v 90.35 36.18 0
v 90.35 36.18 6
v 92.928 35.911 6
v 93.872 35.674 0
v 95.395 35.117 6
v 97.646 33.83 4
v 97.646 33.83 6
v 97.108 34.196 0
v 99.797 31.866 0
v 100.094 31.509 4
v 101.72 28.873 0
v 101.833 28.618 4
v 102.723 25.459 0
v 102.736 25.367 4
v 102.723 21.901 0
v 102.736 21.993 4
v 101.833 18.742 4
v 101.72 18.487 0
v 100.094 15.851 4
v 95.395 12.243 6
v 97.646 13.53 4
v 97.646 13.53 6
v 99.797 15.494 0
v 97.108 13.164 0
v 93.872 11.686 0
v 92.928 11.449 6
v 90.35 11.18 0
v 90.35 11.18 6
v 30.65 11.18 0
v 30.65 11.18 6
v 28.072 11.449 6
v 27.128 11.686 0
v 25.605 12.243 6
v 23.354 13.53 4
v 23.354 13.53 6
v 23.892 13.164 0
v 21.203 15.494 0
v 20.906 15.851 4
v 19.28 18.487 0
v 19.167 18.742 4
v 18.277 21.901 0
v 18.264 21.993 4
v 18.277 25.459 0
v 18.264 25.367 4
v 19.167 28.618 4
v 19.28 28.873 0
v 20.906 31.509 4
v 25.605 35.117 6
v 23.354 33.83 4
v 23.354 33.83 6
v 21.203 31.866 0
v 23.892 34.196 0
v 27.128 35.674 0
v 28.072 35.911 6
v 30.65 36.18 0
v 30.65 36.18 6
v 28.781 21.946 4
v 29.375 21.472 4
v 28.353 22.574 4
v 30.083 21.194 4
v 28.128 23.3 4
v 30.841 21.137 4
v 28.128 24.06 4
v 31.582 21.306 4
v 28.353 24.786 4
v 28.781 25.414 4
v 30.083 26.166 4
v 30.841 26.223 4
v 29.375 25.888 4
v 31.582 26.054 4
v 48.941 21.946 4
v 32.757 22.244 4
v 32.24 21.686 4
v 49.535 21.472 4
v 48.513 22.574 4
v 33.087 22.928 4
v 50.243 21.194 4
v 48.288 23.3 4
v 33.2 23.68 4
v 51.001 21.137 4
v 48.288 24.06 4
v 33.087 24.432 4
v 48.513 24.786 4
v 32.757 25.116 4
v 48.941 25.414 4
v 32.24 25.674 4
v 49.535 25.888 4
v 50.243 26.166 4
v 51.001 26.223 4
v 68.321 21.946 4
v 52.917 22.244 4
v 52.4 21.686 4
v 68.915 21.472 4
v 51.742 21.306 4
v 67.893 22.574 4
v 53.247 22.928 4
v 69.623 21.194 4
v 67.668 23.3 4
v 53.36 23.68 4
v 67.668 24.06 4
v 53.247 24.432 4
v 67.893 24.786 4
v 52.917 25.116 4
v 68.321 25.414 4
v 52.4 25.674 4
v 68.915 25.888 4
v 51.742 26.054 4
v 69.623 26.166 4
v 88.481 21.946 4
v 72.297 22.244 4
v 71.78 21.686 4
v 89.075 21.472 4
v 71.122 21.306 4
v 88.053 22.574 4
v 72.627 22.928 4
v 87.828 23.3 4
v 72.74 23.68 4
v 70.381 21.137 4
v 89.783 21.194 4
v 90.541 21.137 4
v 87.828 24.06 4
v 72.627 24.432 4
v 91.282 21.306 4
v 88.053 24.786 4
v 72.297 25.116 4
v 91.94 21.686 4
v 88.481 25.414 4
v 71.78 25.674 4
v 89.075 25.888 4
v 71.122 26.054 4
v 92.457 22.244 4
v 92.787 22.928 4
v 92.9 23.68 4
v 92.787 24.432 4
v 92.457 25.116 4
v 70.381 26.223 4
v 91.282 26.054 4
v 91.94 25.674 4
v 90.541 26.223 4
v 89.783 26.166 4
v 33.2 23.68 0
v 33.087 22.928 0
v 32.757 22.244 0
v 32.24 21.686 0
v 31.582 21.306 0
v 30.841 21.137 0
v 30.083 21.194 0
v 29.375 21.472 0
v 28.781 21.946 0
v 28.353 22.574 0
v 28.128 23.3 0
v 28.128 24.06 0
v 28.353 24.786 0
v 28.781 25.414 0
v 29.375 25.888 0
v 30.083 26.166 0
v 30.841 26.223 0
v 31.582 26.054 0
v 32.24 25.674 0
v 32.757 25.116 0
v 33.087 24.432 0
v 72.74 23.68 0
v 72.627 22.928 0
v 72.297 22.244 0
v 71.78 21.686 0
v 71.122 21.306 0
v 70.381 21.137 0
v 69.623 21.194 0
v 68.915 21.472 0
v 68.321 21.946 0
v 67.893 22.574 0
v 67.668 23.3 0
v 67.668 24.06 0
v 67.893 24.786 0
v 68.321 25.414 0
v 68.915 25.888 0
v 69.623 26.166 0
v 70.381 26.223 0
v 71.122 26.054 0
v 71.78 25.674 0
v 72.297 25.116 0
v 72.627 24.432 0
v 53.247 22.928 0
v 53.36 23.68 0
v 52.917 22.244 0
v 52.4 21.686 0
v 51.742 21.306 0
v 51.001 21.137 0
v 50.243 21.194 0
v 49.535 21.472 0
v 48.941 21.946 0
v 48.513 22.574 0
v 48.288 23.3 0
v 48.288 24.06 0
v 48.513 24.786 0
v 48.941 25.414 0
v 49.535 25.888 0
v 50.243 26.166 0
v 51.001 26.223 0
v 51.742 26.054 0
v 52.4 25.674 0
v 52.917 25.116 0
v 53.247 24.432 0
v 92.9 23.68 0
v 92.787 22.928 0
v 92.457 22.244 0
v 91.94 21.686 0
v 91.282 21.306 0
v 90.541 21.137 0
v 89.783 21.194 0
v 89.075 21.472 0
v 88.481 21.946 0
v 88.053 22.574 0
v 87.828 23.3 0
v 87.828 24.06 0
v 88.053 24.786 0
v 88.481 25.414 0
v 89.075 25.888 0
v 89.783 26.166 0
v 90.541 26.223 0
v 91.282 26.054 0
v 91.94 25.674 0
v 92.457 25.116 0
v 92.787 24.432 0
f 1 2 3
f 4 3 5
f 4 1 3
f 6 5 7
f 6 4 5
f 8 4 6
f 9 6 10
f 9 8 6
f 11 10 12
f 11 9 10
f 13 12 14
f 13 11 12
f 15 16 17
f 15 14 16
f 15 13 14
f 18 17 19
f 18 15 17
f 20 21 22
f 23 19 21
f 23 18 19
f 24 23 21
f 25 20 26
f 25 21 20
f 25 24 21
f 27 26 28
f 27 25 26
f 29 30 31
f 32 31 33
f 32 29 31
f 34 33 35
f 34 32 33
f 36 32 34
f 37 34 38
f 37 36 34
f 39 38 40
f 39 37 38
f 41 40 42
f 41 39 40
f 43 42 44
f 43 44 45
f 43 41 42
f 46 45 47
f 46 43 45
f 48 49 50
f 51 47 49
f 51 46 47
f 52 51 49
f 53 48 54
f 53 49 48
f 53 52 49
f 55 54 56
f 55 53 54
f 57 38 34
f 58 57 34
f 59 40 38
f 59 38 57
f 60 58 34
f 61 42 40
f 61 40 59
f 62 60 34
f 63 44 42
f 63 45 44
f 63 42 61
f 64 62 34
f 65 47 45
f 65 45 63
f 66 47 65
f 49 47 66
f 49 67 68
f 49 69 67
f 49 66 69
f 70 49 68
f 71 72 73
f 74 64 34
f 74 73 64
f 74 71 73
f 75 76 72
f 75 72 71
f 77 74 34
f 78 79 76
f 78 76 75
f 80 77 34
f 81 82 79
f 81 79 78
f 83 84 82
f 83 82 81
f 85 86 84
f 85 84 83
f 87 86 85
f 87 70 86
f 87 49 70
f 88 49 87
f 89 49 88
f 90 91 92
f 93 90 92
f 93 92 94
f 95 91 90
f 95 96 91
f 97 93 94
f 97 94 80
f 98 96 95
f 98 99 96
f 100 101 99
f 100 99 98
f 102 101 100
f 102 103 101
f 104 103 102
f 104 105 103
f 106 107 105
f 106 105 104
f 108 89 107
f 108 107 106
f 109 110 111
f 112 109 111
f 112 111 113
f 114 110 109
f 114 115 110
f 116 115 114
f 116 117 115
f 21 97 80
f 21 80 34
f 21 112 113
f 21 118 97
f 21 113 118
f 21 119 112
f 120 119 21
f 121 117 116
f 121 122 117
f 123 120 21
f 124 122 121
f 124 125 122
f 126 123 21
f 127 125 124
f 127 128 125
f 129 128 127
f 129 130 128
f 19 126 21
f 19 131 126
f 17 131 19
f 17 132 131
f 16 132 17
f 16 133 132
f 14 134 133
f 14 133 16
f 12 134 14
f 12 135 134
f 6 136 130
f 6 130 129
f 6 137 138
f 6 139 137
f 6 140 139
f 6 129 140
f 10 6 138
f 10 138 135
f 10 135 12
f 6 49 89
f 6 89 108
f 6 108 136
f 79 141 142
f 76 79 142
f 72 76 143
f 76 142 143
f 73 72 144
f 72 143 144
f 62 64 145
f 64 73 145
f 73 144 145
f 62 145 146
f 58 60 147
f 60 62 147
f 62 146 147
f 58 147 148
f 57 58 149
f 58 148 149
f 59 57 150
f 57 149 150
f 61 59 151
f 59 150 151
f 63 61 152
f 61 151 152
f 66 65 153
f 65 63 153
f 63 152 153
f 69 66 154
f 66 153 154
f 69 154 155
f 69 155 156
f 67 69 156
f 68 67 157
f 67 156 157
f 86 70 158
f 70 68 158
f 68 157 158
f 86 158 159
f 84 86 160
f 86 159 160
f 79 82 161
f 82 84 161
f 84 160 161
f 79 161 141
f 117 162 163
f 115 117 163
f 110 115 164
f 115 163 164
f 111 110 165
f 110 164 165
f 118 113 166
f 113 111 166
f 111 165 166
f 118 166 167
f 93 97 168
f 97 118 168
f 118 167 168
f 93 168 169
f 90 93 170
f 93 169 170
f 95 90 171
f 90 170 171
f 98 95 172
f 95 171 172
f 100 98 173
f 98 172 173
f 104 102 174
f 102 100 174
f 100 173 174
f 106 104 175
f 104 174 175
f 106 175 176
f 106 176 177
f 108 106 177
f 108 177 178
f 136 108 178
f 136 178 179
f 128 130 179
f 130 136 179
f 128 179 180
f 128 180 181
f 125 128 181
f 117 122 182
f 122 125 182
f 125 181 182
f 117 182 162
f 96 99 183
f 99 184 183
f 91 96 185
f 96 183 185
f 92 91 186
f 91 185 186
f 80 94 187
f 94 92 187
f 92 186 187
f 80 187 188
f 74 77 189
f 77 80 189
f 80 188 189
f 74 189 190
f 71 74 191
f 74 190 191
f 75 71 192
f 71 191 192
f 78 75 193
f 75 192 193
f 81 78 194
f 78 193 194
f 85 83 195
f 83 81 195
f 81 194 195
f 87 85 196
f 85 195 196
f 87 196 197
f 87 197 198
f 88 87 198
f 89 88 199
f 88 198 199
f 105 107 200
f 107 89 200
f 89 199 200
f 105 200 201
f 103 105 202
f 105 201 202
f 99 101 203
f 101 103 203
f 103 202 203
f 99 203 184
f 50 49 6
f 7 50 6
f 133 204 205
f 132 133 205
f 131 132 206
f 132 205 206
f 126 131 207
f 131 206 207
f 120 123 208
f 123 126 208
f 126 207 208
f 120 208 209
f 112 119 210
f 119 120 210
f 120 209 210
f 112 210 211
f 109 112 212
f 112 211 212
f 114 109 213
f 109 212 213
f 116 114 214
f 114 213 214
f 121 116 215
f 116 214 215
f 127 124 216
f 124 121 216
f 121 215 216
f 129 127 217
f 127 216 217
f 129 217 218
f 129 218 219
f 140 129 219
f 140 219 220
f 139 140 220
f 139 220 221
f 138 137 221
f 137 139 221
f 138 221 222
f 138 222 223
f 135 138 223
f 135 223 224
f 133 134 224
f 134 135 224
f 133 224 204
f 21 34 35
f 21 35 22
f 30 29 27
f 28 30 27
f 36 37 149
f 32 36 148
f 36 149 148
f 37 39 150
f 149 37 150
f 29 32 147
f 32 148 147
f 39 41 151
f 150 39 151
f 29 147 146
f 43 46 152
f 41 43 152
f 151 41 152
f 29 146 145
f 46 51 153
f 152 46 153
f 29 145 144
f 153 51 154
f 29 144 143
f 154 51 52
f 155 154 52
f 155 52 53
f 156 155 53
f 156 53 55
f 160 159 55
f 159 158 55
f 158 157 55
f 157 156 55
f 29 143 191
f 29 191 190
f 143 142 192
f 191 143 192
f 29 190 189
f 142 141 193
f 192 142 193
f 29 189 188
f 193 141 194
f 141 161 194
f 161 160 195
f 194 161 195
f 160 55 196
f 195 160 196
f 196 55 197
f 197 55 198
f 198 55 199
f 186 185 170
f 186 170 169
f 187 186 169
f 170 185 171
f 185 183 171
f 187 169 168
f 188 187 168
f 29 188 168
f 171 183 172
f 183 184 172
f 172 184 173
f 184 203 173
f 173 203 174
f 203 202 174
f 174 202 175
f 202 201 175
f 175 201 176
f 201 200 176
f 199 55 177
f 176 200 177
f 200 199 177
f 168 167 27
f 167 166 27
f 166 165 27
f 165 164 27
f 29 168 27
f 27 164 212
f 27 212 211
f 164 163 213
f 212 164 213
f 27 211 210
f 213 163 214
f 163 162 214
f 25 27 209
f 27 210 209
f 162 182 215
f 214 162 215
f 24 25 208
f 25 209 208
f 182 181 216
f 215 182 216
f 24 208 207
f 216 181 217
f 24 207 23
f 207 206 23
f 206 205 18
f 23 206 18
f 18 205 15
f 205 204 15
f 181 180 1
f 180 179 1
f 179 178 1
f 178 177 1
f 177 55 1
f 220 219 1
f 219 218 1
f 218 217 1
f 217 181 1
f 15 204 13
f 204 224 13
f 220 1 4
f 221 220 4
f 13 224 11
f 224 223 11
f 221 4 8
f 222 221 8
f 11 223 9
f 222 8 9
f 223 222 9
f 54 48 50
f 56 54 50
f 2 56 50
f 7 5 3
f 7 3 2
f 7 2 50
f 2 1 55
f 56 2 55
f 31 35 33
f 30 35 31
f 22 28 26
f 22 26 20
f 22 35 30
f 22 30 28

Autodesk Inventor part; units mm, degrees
ref_plane "YZ Plane" through (0, 0, 0) normal (1, 0, 0) x (0, 1, 0)
ref_plane "XZ Plane" through (0, 0, 0) normal (0, 1, 0) x (-1, 0, 0)
ref_plane "XY Plane" through (0, 0, 0) normal (0, 0, 1) x (1, 0, 0)
sketch "Sketch1" plane through (0, 0, 0) normal (0, 0, 1) x (1, 0, 0)
  arc A0 (-3, 3) -> (0, 0) centre (0, 3) ccw construction
  line L0 (0, 0) -> (121, 0) construction
  arc A1 (121, 0) -> (124, 3) centre (121, 3) ccw construction
  line L1 (124, 3) -> (124, 85) construction
  arc A2 (124, 85) -> (121, 88) centre (121, 85) ccw construction
  line L2 (121, 88) -> (0, 88) construction
  arc A3 (0, 88) -> (-3, 85) centre (0, 85) ccw construction
  line L3 (-3, 85) -> (-3, 3) construction
  arc A4 (63.75, 4.5) -> (63.75, 7.5) centre (63.75, 6) ccw construction
  line L4 (57.25, 4.5) -> (63.75, 4.5) construction
  arc A5 (57.25, 7.5) -> (57.25, 4.5) centre (57.25, 6) ccw construction
  line L5 (63.75, 7.5) -> (57.25, 7.5) construction
  arc A6 (70.5, 11.18) -> (70.5, 16.18) centre (70.5, 13.68) ccw construction
  line L6 (50.5, 11.18) -> (70.5, 11.18) construction
  arc A7 (50.5, 16.18) -> (50.5, 11.18) centre (50.5, 13.68) ccw construction
  line L7 (70.5, 16.18) -> (50.5, 16.18) construction
  arc A8 (43.75, 80.5) -> (43.75, 83.5) centre (43.75, 82) ccw construction
  line L8 (37.25, 80.5) -> (43.75, 80.5) construction
  arc A9 (37.25, 83.5) -> (37.25, 80.5) centre (37.25, 82) ccw construction
  line L9 (43.75, 83.5) -> (37.25, 83.5) construction
  arc A10 (70.5, 71.82) -> (70.5, 76.82) centre (70.5, 74.32) ccw construction
  line L10 (50.5, 71.82) -> (70.5, 71.82) construction
  arc A11 (50.5, 76.82) -> (50.5, 71.82) centre (50.5, 74.32) ccw construction
  line L11 (70.5, 76.82) -> (50.5, 76.82) construction
  circle A12 centre (30.65, 13.68) radius 3.55 construction
  circle A13 centre (10.65, 23.68) radius 2.55 construction
  circle A14 centre (30.65, 23.68) radius 2.55
  circle A15 centre (50.81, 23.68) radius 2.55
  circle A16 centre (80.35, 23.68) radius 2.55 construction
  circle A17 centre (100.35, 23.68) radius 2.55 construction
  circle A18 centre (100.35, 13.68) radius 2.55 construction
  circle A19 centre (80.35, 44) radius 2.55 construction
  circle A20 centre (90.35, 44) radius 2.55 construction
  circle A21 centre (80.35, 13.68) radius 2.55 construction
  circle A22 centre (100.35, 64.32) radius 2.55 construction
  circle A23 centre (80.35, 74.32) radius 2.55 construction
  circle A24 centre (90.35, 74.32) radius 2.55 construction
  circle A25 centre (30.65, 74.32) radius 3.55 construction
  circle A26 centre (40.18, 34) radius 2.55 construction
  circle A27 centre (30.65, 44) radius 3.55 construction
  circle A28 centre (70.19, 64.32) radius 2.55 construction
  circle A29 centre (20.65, 44) radius 3.55 construction
  circle A30 centre (60.5, 34) radius 2.55 construction
  circle A31 centre (100.35, 74.32) radius 2.55 construction
  circle A32 centre (90.82, 34) radius 2.55 construction
  circle A33 centre (110.35, 74.32) radius 2.55 construction
  circle A34 centre (90.82, 54) radius 2.55 construction
  circle A35 centre (75.325, 58.825) radius 2.55 construction
  circle A36 centre (30.65, 64.32) radius 2.55 construction
  circle A37 centre (10.65, 64.32) radius 2.55 construction
  circle A38 centre (45.675, 58.825) radius 2.55 construction
  circle A39 centre (10.65, 13.68) radius 3.55 construction
  circle A40 centre (10.65, 74.32) radius 3.55 construction
  circle A41 centre (50.5, 44) radius 2.55 construction
  circle A42 centre (60.5, 54) radius 2.55 construction
  circle A43 centre (60.5, 44) radius 2.55 construction
  circle A44 centre (70.5, 44) radius 2.55 construction
  circle A45 centre (40.18, 54) radius 2.55 construction
  circle A46 centre (10.65, 44) radius 3.55 construction
  circle A47 centre (30.18, 54) radius 2.55 construction
  circle A48 centre (60.5, 64.32) radius 2.55 construction
  circle A49 centre (20.65, 64.32) radius 2.55 construction
  circle A50 centre (20.65, 74.32) radius 3.55 construction
  circle A51 centre (80.82, 54) radius 2.55 construction
  circle A52 centre (40.65, 64.32) radius 2.55 construction
  circle A53 centre (110.35, 44) radius 2.55 construction
  circle A54 centre (110.35, 13.68) radius 2.55 construction
  circle A55 centre (80.82, 34) radius 2.55 construction
  circle A56 centre (75.325, 29.175) radius 2.55 construction
  circle A57 centre (50.81, 64.32) radius 2.55 construction
  circle A58 centre (80.35, 64.32) radius 2.55 construction
  circle A59 centre (45.675, 29.175) radius 2.55 construction
  circle A60 centre (30.18, 34) radius 2.55 construction
  circle A61 centre (40.65, 74.32) radius 3.55 construction
  circle A62 centre (40.65, 44) radius 3.55 construction
  circle A63 centre (90.35, 64.32) radius 2.55 construction
  circle A64 centre (110.35, 64.32) radius 2.55 construction
  circle A65 centre (100.35, 44) radius 2.55 construction
  circle A66 centre (60.5, 23.68) radius 2.55 construction
  circle A67 centre (90.35, 13.68) radius 2.55 construction
  circle A68 centre (110.35, 23.68) radius 2.55 construction
  circle A69 centre (90.35, 23.68) radius 2.55
  circle A70 centre (70.19, 23.68) radius 2.55
  circle A71 centre (40.65, 23.68) radius 2.55 construction
  circle A72 centre (20.65, 23.68) radius 2.55 construction
  circle A73 centre (40.65, 13.68) radius 3.55 construction
  circle A74 centre (20.65, 13.68) radius 3.55 construction
  arc A75 (63.75, 80.5) -> (63.75, 83.5) centre (63.75, 82) ccw construction
  line L12 (57.25, 80.5) -> (63.75, 80.5) construction
  arc A76 (57.25, 83.5) -> (57.25, 80.5) centre (57.25, 82) ccw construction
  line L13 (63.75, 83.5) -> (57.25, 83.5) construction
  arc A77 (77.25, 83.5) -> (77.25, 80.5) centre (77.25, 82) ccw construction
  line L14 (83.75, 83.5) -> (77.25, 83.5) construction
  arc A78 (83.75, 80.5) -> (83.75, 83.5) centre (83.75, 82) ccw construction
  line L15 (77.25, 80.5) -> (83.75, 80.5) construction
  arc A79 (43.75, 4.5) -> (43.75, 7.5) centre (43.75, 6) ccw construction
  line L16 (37.25, 4.5) -> (43.75, 4.5) construction
  arc A80 (37.25, 7.5) -> (37.25, 4.5) centre (37.25, 6) ccw construction
  line L17 (43.75, 7.5) -> (37.25, 7.5) construction
  arc A81 (77.25, 7.5) -> (77.25, 4.5) centre (77.25, 6) ccw construction
  line L18 (83.75, 7.5) -> (77.25, 7.5) construction
  arc A82 (83.75, 4.5) -> (83.75, 7.5) centre (83.75, 6) ccw construction
  line L19 (77.25, 4.5) -> (83.75, 4.5) construction
  line L20 (30.65, 23.68) -> (90.35, 23.68) construction
  line L21 (30.65, 11.18) -> (90.35, 11.18)
  line L22 (90.35, 36.18) -> (30.65, 36.18)
  arc A83 (30.65, 36.18) -> (30.65, 11.18) centre (30.65, 23.68) ccw
  arc A84 (90.35, 11.18) -> (90.35, 36.18) centre (90.35, 23.68) ccw
  line L23 (23.3543, 33.83) -> (97.6457, 33.83)
  line L24 (23.3543, 13.53) -> (97.6457, 13.53)
  point P0 (60.5, 23.68)
  dimension "d0" = 25
  dimension "d3" = 20.3
extrude "Extrusion1" add sketch "Sketch1" along normal blind 4
extrude "Extrusion2" add sketch "Sketch1" along normal blind 6 contours A83 L24 A84 L21 | A83 L22 A84 L23
sketch "Sketch2" plane through (30.65, 36.18, 0) normal (0, 1, 0) x (1, 0, 0)
  line L0 (0, -6) -> (59.7, -6) projected
  line L1 (29.85, -6) -> (29.85, 29.1247)
  point P0 (-30.65, 0)
surface extrude "ExtrusionSrf1" sketch "Sketch2" against normal blind 39.35 shown yes curves L1
properties part number "Espaciador Actuador - Antenas" material "PET Plastic"
